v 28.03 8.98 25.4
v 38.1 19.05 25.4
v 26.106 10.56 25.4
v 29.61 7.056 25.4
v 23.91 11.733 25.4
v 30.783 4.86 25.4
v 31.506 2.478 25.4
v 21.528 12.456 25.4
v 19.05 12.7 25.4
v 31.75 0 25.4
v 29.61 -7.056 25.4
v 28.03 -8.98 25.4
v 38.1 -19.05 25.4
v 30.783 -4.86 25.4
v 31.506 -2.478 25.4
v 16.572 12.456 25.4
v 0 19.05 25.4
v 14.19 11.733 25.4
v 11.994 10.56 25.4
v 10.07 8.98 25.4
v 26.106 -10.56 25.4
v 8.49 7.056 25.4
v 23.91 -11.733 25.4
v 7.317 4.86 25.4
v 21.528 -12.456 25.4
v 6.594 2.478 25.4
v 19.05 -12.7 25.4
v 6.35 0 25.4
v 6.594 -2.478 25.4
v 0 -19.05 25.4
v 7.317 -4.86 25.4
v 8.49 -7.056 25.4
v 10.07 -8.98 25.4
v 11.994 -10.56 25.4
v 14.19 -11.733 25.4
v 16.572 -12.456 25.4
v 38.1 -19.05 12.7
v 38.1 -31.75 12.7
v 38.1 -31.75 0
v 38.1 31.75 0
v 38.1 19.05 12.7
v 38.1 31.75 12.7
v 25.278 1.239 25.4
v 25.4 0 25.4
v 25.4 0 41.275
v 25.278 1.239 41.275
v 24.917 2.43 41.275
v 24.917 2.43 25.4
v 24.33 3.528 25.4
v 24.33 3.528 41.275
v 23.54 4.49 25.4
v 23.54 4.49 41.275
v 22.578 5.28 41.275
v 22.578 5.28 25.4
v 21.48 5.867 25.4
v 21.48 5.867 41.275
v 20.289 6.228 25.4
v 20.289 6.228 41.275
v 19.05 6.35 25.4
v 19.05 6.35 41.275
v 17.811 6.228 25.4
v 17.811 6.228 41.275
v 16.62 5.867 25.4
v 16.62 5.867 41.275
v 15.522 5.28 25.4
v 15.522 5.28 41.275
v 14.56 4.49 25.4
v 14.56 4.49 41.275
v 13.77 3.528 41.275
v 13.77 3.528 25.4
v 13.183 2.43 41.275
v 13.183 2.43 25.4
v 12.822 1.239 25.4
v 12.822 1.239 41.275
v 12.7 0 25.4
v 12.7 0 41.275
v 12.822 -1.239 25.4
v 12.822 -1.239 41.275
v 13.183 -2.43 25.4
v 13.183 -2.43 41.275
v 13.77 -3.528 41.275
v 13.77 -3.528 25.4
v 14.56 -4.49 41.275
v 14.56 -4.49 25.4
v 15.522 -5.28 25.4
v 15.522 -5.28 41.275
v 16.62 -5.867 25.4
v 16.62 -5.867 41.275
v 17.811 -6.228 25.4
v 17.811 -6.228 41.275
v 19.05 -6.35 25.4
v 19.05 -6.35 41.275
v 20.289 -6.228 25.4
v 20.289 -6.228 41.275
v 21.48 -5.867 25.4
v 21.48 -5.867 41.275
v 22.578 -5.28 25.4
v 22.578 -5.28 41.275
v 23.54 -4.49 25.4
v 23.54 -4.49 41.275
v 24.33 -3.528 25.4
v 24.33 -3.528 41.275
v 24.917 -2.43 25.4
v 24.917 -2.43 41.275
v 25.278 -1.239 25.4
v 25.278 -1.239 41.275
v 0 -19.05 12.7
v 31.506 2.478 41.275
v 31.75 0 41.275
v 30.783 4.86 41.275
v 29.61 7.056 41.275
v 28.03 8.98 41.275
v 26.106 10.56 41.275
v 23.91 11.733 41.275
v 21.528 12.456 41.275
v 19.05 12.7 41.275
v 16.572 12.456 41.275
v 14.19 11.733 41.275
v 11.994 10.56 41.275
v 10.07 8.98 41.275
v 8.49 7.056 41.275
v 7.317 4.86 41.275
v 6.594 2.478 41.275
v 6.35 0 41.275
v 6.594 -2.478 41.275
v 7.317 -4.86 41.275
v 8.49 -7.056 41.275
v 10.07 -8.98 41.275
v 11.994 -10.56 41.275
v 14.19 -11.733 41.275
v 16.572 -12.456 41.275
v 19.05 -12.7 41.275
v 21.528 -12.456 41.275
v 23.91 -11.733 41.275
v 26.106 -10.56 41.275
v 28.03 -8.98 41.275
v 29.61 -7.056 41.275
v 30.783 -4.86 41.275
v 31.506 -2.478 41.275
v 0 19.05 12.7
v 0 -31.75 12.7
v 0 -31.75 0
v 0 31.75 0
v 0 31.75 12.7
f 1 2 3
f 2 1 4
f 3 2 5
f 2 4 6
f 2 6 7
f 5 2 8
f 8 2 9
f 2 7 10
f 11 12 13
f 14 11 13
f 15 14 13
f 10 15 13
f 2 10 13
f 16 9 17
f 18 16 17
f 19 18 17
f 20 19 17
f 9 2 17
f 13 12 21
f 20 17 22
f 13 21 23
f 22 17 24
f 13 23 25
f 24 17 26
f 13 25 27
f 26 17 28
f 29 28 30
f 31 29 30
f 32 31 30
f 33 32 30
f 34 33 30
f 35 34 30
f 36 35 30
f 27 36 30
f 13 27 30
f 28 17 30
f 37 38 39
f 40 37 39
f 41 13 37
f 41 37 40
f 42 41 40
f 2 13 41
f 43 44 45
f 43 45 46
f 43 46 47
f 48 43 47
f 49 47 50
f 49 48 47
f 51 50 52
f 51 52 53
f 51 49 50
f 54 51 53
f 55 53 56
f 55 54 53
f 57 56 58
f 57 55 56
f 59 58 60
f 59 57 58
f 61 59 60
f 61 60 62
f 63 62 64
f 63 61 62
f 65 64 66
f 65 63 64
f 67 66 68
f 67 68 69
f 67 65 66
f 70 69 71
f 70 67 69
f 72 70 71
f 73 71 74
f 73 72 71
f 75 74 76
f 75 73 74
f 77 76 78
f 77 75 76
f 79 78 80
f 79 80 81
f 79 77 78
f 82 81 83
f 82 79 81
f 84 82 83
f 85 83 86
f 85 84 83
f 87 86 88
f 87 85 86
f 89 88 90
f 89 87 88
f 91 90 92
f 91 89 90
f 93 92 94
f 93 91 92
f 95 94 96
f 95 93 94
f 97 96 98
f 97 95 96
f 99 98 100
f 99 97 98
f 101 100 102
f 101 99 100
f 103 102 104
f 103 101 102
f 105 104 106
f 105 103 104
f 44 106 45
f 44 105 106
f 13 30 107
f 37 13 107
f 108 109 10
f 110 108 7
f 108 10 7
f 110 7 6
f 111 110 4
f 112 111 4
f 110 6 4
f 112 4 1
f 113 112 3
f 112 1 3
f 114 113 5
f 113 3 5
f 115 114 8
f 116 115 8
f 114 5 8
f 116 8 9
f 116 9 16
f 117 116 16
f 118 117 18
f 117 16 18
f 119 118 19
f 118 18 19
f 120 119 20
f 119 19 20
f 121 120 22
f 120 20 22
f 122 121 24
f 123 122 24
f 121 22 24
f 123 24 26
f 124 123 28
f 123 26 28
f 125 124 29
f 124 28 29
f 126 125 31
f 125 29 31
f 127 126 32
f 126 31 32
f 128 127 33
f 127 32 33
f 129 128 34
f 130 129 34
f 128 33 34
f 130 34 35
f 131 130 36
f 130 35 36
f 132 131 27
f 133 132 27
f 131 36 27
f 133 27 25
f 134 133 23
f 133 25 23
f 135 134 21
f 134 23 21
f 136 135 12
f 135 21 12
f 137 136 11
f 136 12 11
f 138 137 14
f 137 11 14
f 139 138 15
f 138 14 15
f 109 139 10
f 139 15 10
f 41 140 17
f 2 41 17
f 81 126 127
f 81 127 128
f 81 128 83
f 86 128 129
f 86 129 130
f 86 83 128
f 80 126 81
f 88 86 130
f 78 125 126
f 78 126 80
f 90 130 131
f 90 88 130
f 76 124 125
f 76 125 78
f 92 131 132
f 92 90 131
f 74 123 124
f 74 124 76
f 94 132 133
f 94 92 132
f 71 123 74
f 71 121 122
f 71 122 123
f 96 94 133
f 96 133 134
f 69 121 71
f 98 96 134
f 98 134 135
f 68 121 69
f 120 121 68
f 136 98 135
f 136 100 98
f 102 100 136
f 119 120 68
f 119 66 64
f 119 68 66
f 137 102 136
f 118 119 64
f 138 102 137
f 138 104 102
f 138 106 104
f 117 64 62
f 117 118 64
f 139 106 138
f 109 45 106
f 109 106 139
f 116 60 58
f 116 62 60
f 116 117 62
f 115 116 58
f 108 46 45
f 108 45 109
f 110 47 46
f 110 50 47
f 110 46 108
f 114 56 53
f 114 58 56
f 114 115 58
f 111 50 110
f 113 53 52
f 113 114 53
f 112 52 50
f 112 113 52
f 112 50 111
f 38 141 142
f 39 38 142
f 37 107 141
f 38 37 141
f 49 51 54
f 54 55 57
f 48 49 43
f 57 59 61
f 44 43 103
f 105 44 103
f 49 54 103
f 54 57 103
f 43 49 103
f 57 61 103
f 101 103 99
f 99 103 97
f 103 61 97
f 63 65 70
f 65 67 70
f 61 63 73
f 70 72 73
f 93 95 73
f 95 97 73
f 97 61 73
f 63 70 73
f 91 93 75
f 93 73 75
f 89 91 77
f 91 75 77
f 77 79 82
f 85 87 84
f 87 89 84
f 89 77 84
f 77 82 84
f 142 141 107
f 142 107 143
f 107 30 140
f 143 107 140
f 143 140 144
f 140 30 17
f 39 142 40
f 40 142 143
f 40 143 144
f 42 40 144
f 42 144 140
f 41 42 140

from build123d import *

# Parameters (mm, degrees)
F1_DEPTH = 38.1
F2_R     = 12.7
F2_R_2   = 6.35
F3_DEPTH = 15.875


with BuildPart() as f1:
    # F0 (on Right) → F1 (new body)
    with BuildSketch(Plane.YZ):
        Polygon((-31.75, 0), (0, 0), (0, 25.4), (-19.05, 25.4), (-19.05, 12.7), (-31.75, 12.7), align=None)
        Polygon((0, 25.4), (0, 0), (31.75, 0), (31.75, 12.7), (19.05, 12.7), (19.05, 25.4), align=None)
    extrude(amount=F1_DEPTH)

    # F2 (on face) → F3 (join)
    with BuildSketch(Plane.XY.offset(25.4)):
        with Locations((19.05, 0)):
            Circle(F2_R)
        with Locations((19.05, 0)):
            Circle(F2_R_2, mode=Mode.SUBTRACT)
    extrude(amount=F3_DEPTH)


solid = f1.part
